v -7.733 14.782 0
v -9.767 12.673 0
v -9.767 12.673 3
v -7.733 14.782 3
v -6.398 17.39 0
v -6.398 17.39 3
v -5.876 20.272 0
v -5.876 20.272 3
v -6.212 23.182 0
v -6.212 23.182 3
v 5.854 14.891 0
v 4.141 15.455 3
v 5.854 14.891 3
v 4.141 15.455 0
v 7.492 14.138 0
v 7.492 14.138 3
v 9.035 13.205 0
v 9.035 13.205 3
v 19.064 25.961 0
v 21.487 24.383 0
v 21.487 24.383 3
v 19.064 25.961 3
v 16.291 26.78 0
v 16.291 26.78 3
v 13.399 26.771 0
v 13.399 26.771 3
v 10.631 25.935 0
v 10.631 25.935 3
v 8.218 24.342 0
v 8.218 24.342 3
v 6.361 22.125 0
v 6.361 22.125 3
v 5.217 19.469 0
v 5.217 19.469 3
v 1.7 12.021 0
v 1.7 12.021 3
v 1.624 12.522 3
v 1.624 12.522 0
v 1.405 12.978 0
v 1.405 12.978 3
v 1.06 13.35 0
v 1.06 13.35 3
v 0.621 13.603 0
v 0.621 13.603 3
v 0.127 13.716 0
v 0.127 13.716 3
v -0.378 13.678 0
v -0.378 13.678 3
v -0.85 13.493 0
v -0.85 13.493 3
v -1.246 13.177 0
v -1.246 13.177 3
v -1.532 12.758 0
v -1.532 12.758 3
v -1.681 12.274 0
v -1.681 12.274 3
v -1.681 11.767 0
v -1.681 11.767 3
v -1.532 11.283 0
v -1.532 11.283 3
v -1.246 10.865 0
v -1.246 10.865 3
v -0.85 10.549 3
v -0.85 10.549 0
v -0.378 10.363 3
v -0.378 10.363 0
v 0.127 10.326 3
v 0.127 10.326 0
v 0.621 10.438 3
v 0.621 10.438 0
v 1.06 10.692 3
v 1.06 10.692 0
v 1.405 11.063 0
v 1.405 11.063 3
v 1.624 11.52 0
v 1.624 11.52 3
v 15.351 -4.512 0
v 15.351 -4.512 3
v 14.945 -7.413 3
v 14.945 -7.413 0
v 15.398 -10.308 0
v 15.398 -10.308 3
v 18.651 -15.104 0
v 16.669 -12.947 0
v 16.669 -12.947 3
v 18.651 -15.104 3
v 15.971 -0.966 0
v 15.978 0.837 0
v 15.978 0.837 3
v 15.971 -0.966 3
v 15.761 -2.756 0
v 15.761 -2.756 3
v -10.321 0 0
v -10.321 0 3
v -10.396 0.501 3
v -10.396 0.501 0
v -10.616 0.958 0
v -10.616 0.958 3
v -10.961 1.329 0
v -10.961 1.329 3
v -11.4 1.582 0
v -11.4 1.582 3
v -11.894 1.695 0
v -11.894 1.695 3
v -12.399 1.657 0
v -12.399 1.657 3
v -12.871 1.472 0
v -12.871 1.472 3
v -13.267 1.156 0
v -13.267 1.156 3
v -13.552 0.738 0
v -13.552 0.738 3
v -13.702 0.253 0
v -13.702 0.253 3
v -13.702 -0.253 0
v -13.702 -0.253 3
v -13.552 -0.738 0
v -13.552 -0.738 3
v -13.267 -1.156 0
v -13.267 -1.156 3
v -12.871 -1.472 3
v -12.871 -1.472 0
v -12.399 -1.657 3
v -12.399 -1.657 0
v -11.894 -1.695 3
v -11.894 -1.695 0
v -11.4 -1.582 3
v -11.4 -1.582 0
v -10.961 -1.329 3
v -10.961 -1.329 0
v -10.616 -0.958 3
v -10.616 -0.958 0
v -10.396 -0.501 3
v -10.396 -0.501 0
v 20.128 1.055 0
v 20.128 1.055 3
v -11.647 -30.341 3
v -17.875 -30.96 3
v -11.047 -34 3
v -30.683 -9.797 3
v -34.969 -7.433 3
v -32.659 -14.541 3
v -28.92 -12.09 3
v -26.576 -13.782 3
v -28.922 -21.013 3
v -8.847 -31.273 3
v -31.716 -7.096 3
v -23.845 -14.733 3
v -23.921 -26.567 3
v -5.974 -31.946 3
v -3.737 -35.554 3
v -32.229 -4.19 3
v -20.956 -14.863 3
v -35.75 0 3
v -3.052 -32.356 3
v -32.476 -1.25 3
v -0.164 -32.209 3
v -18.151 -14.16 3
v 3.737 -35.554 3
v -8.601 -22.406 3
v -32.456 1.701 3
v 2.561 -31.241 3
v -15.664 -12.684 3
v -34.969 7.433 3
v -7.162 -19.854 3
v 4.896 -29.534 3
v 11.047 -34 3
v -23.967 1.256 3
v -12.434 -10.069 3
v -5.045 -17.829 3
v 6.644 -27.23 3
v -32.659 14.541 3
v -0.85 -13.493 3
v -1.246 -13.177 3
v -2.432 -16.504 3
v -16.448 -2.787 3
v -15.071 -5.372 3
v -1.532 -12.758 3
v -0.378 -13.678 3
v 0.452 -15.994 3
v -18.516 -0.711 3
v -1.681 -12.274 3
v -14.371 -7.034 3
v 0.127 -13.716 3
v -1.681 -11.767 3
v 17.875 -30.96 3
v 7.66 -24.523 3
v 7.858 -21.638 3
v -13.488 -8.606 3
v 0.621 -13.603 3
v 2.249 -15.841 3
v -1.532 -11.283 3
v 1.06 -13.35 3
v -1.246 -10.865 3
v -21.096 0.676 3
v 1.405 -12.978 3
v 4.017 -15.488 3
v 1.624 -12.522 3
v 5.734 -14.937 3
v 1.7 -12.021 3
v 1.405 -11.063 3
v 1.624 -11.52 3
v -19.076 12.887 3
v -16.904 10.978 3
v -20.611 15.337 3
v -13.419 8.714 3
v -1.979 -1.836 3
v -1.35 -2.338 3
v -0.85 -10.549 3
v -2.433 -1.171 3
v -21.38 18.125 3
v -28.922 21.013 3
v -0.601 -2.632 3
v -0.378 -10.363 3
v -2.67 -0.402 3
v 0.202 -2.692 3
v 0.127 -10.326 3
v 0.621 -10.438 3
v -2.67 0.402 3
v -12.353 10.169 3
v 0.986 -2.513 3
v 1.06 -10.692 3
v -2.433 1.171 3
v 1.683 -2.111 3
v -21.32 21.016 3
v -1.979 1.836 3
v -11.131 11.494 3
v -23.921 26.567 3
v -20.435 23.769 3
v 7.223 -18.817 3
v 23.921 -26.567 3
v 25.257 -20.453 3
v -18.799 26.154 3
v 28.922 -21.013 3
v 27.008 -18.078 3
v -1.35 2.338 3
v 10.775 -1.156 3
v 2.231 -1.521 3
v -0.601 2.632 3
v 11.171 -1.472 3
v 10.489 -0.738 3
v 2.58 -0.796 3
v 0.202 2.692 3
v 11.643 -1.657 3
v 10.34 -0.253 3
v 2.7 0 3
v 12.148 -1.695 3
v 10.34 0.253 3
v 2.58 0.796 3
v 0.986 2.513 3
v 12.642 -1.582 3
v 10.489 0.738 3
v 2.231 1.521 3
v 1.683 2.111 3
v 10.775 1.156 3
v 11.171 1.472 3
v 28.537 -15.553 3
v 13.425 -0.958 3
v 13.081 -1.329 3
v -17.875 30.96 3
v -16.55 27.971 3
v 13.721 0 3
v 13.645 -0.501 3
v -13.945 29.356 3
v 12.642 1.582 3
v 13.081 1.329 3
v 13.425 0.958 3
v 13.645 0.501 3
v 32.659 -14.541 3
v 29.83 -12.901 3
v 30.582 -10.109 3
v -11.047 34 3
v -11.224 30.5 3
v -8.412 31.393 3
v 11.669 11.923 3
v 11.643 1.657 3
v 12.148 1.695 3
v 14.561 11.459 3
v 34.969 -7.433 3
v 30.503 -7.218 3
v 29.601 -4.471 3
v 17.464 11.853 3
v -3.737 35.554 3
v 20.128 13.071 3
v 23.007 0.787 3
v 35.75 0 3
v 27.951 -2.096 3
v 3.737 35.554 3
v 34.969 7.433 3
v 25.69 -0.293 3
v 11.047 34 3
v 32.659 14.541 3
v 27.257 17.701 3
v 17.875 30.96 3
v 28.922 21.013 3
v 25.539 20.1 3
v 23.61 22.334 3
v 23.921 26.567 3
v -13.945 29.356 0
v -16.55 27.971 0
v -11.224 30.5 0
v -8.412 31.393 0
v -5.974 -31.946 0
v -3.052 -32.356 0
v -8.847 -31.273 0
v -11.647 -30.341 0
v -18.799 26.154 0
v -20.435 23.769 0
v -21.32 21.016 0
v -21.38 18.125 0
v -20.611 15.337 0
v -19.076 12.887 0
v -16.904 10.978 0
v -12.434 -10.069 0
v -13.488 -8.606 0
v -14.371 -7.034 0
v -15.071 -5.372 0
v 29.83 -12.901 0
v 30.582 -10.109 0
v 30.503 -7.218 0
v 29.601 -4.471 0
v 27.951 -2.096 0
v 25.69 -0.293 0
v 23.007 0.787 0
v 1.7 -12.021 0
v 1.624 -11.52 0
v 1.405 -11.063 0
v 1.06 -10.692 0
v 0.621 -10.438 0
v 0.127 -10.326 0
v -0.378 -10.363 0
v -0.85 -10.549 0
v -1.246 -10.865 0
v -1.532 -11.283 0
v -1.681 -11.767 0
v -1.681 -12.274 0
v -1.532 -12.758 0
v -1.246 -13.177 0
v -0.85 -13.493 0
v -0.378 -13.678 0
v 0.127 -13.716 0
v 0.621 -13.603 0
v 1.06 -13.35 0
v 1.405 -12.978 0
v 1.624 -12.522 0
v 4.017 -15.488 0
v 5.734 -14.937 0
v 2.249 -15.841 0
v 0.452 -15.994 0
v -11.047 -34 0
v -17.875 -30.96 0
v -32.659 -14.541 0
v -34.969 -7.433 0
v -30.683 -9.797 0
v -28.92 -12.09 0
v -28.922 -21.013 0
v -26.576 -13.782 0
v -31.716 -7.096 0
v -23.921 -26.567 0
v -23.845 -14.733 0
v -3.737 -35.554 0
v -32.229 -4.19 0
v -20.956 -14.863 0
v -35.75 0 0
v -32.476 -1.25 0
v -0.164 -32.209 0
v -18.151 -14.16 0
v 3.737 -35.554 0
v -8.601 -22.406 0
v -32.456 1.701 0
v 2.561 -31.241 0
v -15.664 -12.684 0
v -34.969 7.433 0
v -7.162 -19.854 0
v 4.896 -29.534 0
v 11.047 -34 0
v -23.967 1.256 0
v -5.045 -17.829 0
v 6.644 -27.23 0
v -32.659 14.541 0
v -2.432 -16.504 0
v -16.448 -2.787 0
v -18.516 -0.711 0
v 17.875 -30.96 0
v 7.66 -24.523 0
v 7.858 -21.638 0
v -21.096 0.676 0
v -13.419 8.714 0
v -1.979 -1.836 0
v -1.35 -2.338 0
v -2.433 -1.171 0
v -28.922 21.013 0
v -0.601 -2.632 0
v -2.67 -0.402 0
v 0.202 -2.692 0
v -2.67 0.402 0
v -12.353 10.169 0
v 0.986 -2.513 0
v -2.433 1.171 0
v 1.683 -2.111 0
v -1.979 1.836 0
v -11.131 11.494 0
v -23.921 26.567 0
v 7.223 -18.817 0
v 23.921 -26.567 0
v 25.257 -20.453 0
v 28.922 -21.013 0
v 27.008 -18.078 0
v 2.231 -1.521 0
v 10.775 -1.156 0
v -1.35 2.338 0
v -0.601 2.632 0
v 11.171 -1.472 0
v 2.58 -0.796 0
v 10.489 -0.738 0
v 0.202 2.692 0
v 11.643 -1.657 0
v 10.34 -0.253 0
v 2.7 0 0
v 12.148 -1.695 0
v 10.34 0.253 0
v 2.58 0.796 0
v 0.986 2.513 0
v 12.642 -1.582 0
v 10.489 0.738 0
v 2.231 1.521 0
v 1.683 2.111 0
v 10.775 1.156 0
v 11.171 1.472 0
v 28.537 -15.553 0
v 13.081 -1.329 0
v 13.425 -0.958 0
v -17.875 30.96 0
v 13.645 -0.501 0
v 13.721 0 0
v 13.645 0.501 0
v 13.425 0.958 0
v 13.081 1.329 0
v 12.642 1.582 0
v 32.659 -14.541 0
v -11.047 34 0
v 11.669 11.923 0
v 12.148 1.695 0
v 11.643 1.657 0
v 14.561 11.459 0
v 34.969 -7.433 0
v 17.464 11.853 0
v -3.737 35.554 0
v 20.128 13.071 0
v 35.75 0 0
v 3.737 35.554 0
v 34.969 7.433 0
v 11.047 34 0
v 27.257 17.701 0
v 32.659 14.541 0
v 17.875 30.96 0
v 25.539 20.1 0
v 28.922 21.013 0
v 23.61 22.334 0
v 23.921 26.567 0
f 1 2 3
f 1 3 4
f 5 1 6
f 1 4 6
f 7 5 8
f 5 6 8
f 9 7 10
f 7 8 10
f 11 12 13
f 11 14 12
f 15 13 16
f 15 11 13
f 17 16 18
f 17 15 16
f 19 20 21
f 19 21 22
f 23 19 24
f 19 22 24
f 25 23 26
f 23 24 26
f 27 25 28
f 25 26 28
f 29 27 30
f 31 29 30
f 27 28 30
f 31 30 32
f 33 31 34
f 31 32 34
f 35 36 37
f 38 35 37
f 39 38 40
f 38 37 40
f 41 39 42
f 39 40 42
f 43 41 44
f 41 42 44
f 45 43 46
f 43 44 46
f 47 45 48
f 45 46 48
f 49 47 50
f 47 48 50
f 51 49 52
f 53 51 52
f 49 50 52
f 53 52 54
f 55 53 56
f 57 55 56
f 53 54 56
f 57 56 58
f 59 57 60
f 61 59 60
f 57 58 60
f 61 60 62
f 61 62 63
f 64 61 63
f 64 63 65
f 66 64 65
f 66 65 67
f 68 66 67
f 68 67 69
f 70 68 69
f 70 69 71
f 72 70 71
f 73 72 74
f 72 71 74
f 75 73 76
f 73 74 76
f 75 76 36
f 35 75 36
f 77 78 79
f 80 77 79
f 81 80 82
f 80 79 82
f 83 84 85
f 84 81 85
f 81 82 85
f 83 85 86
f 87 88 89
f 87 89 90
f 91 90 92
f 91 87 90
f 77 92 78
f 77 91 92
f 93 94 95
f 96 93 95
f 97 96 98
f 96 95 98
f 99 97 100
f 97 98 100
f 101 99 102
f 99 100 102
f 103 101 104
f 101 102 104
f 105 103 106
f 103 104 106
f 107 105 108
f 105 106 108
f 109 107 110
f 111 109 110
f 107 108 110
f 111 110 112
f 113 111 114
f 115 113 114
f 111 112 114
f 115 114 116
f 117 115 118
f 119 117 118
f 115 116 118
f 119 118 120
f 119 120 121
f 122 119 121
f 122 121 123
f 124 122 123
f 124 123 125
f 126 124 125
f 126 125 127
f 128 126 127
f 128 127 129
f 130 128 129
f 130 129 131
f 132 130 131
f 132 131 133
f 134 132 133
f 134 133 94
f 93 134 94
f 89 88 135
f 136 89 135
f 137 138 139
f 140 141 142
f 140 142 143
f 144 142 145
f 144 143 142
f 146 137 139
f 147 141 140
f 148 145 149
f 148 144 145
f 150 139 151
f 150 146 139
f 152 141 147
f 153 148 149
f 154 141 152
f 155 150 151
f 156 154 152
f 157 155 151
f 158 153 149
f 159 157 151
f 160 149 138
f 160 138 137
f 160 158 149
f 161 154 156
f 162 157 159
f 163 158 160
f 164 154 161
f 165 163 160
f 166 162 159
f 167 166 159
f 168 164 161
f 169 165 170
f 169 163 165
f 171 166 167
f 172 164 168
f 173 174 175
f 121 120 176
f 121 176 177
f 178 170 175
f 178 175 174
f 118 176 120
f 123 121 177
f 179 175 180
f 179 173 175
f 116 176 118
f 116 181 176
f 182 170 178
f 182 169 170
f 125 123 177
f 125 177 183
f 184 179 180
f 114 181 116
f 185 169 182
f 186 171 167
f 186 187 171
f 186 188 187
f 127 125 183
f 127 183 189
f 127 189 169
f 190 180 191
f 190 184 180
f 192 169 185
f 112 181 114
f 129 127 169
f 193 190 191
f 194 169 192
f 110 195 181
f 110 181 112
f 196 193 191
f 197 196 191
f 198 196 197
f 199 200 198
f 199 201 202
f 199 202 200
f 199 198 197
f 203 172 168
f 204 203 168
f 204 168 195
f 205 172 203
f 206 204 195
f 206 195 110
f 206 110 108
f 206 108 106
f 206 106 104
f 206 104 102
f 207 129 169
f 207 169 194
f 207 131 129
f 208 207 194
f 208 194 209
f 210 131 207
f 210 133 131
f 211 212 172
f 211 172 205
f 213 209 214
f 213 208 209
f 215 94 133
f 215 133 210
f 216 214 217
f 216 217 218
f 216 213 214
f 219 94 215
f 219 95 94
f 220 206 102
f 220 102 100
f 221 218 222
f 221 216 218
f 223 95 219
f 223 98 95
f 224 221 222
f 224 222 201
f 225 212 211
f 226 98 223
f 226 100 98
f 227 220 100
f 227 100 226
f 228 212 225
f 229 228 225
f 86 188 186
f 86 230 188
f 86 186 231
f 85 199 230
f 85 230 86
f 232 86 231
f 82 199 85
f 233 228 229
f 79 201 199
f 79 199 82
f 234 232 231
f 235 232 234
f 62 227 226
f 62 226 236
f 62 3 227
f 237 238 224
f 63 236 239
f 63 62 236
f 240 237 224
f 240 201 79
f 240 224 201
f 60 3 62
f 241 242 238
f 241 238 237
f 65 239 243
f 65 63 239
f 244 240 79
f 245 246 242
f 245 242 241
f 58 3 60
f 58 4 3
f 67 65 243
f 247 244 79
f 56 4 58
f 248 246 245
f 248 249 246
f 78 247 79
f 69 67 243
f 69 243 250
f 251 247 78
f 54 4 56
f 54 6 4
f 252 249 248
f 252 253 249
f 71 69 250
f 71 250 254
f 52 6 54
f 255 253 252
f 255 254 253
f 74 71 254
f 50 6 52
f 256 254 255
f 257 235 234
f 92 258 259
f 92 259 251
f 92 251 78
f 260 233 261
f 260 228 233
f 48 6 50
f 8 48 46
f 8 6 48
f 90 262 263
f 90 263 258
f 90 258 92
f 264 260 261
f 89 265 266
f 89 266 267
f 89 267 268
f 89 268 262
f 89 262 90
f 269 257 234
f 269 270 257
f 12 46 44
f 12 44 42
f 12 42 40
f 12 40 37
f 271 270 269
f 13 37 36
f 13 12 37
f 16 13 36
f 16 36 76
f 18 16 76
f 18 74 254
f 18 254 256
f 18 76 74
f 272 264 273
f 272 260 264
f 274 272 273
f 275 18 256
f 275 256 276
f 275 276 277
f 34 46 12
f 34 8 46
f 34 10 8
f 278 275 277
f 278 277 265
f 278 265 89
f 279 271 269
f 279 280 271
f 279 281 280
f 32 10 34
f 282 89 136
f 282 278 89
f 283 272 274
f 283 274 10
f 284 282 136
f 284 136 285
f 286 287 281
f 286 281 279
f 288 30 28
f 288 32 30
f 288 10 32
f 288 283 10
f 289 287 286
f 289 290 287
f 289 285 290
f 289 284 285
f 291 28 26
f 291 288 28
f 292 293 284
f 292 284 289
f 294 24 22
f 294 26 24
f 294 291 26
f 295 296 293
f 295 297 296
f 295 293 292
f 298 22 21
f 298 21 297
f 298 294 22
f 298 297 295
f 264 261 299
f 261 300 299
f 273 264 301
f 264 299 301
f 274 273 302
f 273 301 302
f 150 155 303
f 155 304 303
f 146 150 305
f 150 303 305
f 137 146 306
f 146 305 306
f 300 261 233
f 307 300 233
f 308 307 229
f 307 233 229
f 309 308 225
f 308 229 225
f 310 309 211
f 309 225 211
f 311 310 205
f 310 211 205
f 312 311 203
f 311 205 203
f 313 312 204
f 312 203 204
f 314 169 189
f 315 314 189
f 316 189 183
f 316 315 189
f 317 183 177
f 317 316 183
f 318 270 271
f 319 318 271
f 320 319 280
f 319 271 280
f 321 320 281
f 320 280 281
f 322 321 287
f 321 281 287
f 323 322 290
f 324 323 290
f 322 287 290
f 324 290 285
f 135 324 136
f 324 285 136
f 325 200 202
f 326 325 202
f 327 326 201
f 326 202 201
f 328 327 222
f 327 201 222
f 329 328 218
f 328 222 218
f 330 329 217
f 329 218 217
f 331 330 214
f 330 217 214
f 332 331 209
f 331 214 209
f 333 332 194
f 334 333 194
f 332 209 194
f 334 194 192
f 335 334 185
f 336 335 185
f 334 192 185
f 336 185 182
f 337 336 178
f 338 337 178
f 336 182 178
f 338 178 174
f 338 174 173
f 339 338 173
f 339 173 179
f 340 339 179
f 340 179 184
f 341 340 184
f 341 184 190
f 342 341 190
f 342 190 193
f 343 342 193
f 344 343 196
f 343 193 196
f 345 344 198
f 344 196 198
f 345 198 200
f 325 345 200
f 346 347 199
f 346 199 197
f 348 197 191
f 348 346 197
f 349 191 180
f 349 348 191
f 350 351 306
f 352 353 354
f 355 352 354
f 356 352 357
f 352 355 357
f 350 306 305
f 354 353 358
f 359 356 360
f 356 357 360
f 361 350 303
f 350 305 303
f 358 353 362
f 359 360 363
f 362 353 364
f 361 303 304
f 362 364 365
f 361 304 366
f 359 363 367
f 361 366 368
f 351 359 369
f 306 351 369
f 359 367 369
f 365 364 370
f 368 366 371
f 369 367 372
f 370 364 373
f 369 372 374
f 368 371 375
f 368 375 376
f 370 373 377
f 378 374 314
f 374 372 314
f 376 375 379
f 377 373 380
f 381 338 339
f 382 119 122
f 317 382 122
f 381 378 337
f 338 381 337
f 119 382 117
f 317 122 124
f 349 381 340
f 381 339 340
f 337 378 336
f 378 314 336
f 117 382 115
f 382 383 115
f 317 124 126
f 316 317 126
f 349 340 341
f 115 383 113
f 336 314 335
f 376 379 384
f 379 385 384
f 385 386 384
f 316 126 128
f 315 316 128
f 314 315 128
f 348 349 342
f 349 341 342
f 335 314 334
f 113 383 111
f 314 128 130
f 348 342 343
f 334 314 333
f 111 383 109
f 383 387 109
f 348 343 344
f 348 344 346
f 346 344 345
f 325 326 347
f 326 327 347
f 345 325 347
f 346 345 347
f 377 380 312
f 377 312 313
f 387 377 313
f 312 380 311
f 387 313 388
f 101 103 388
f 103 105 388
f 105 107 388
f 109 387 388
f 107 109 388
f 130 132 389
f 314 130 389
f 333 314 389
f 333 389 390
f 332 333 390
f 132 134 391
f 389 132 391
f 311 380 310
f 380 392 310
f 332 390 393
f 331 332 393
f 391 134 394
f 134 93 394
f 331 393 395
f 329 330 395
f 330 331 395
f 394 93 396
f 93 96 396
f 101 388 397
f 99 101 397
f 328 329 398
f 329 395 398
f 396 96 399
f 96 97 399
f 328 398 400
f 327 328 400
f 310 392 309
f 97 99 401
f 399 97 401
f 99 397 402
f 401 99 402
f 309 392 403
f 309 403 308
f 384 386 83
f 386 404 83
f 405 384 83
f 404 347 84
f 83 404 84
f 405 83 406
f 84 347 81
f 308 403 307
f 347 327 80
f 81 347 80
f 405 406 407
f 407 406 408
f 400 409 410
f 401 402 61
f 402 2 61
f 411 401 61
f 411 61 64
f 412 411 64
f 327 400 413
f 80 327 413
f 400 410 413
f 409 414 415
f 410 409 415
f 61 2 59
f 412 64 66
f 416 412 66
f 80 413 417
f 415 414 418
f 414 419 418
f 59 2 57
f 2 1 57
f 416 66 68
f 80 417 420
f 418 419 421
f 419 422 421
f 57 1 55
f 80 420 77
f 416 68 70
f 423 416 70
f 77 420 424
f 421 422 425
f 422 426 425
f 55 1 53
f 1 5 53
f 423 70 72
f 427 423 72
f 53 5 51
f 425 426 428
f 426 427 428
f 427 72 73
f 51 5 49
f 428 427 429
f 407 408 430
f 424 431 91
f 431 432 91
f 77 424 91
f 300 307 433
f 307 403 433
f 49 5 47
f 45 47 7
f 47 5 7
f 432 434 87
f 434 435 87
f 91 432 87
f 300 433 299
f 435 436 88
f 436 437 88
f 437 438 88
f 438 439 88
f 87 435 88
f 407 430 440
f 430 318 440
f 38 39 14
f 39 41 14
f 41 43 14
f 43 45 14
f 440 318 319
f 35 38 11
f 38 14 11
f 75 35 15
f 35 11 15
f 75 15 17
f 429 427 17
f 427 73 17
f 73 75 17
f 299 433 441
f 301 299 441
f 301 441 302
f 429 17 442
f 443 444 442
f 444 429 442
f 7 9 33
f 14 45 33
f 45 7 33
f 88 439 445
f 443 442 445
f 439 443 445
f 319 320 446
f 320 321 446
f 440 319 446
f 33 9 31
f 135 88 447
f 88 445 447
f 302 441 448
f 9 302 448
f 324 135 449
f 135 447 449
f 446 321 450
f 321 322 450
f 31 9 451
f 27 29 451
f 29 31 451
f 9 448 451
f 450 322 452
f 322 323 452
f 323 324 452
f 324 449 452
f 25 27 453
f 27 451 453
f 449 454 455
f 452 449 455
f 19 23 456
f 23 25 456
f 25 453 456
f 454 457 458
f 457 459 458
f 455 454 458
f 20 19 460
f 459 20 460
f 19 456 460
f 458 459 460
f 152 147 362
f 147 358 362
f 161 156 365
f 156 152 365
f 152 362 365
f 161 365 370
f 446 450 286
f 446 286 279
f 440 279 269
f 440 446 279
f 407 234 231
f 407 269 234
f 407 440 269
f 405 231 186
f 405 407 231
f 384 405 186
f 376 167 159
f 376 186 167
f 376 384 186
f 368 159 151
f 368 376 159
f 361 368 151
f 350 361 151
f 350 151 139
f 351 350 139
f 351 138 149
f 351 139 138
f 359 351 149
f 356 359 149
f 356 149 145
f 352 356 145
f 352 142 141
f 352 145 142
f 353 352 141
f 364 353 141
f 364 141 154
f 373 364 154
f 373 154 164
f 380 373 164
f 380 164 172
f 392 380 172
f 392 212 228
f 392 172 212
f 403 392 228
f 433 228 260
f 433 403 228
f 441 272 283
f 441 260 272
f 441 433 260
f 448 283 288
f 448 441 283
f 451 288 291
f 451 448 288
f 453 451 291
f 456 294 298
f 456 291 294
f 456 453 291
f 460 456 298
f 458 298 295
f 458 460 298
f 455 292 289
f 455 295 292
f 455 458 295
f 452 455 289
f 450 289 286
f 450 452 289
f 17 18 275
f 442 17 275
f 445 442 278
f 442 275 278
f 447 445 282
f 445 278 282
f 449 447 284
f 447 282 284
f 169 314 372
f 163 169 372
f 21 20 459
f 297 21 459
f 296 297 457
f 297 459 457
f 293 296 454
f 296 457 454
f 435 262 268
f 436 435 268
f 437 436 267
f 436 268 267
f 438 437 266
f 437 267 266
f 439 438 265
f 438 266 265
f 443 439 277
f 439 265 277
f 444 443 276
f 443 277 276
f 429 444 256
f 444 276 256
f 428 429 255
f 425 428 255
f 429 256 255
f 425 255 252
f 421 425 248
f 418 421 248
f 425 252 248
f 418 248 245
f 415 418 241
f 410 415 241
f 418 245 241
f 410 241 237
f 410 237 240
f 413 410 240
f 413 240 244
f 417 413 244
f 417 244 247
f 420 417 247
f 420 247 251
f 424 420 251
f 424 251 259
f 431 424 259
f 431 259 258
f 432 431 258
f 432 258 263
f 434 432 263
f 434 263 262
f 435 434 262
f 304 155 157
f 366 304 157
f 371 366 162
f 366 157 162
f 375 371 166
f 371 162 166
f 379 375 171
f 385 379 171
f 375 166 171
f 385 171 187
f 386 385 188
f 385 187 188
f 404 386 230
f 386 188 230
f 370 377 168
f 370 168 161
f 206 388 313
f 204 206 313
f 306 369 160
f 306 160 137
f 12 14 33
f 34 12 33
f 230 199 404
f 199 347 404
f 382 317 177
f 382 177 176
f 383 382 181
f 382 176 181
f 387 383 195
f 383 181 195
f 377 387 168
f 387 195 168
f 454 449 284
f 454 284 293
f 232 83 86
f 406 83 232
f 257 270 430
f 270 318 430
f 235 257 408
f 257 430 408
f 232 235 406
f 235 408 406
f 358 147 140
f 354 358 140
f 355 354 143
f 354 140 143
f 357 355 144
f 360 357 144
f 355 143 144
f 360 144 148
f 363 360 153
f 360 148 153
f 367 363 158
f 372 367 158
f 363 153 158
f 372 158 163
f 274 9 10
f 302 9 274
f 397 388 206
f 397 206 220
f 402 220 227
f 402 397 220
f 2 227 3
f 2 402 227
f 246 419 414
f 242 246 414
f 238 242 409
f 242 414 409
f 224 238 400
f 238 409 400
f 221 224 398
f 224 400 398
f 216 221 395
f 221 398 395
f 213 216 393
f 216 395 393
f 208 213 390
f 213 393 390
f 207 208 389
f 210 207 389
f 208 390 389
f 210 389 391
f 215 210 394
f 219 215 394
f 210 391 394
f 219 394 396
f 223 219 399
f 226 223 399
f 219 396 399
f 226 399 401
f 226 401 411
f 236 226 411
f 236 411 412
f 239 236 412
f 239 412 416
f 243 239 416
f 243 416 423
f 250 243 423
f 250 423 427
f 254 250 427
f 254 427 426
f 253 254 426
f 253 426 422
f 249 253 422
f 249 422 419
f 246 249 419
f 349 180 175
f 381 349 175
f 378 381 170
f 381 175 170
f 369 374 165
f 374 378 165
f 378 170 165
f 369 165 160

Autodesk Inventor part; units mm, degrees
ref_plane "YZ Plane" through (0, 0, 0) normal (1, 0, 0) x (0, 1, 0)
ref_plane "XZ Plane" through (0, 0, 0) normal (0, 1, 0) x (-1, 0, 0)
ref_plane "XY Plane" through (0, 0, 0) normal (0, 0, 1) x (1, 0, 0)
sketch "Sketch1" plane through (0, 0, 0) normal (0, 0, 1) x (1, 0, 0)
  circle A0 centre (0, 0) radius 35.75
  circle A1 centre (0, 0) radius 32.5
  circle A2 centre (0, 0) radius 16
  circle A3 centre (0, 0) radius 2.7
  line L0 (0, 0) -> (-8.4116, 31.3926)
  line L1 (0, 0) -> (8.4116, 31.3926)
  line L2 (0, 0) -> (0, 4.5704)
  line L3 (0, 0) -> (-32.4555, 1.7009)
  line L4 (0, 0) -> (-27.2568, 17.7008)
  line L5 (0, 0) -> (-11.647, -30.3414)
  line L6 (0, 0) -> (-25.2572, -20.4529)
  line L7 (0, 0) -> (25.2572, -20.4529)
  line L8 (0, 0) -> (11.647, -30.3414)
  line L9 (0, 0) -> (27.2568, 17.7008)
  line L10 (0, 0) -> (32.4555, 1.7009)
  point P0 (4.1411, 15.4548)
  point P1 (13.4187, 8.7142)
  point P2 (-4.1411, 15.4548)
  point P3 (-13.4187, 8.7142)
  point P4 (12.4343, -10.0691)
  point P5 (15.9781, 0.8374)
  point P6 (-5.7339, -14.9373)
  point P7 (5.7339, -14.9373)
  point P8 (-15.9781, 0.8374)
  point P9 (-12.4343, -10.0691)
  dimension "d0" = 71.5
  dimension "d1" = 65
  dimension "d2" = 5.4
  dimension "d3" = 32
  dimension "d4" = 15
  dimension "d5" = 15
  dimension "d8" = 360
extrude "Extrusion1" add sketch "Sketch1" along normal blind 3 contours A0 | L10 A2 L9 A1 | A1 L8 A2 L7 | L10 A3 L9 A2 | A2 L7 A3 L10 | A2 L8 A3 L7 | L1 A2 L0 A1 | L9 A3 L1 A2 | A1 L6 A2 L5 | A2 L5 A3 L8 | L1 A3 L0 A2 | A2 L6 A3 L5 | L4 A2 L3 A1 | L0 A3 L4 A2 | L3 A2 L4 A3 | A3 L6 A2 L3
fillet "Fillet1" radius 10 10 edges at (8.4116, 31.3926, 1.5) (-27.2568, 17.7008, 1.5) (-25.2572, -20.4529, 1.5) (11.647, -30.3414, 1.5) (32.4555, 1.7009, 1.5) (-15.9781, 0.8374, 1.5) (-4.1411, 15.4548, 1.5) (13.4187, 8.7142, 1.5) (12.4343, -10.0691, 1.5) (-5.7339, -14.9373, 1.5)
sketch "Sketch2" plane through (0, 0, 3) normal (0, 0, 1) x (1, 0, 0)
  circle A0 centre (0, 12.0208) radius 1.7
  circle A1 centre (-12.0208, 0) radius 1.7
  circle A2 centre (0, -12.0208) radius 1.7
  circle A3 centre (12.0208, 0) radius 1.7
  line L0 (0, 12.0208) -> (-12.0208, 0)
  line L1 (-12.0208, 0) -> (0, -12.0208)
  line L2 (0, -12.0208) -> (12.0208, 0)
  line L3 (12.0208, 0) -> (0, 12.0208)
  point P0 (0, 0)
  dimension "d13" = 17
  dimension "d14" = 17
  dimension "d15" = 3.4
  dimension "d16" = 3.4
  dimension "d17" = 3.4
  dimension "d18" = 3.4
extrude "Extrusion2" cut sketch "Sketch2" against normal blind 3 contours A0 L3 L0 | L0 L3 A0 | L0 L1 A1 | A1 L1 L0 | L3 L2 A3 | A3 L2 L3 | L1 L2 A2 | A2 L2 L1
properties part number "Wheel_2D_Int"
